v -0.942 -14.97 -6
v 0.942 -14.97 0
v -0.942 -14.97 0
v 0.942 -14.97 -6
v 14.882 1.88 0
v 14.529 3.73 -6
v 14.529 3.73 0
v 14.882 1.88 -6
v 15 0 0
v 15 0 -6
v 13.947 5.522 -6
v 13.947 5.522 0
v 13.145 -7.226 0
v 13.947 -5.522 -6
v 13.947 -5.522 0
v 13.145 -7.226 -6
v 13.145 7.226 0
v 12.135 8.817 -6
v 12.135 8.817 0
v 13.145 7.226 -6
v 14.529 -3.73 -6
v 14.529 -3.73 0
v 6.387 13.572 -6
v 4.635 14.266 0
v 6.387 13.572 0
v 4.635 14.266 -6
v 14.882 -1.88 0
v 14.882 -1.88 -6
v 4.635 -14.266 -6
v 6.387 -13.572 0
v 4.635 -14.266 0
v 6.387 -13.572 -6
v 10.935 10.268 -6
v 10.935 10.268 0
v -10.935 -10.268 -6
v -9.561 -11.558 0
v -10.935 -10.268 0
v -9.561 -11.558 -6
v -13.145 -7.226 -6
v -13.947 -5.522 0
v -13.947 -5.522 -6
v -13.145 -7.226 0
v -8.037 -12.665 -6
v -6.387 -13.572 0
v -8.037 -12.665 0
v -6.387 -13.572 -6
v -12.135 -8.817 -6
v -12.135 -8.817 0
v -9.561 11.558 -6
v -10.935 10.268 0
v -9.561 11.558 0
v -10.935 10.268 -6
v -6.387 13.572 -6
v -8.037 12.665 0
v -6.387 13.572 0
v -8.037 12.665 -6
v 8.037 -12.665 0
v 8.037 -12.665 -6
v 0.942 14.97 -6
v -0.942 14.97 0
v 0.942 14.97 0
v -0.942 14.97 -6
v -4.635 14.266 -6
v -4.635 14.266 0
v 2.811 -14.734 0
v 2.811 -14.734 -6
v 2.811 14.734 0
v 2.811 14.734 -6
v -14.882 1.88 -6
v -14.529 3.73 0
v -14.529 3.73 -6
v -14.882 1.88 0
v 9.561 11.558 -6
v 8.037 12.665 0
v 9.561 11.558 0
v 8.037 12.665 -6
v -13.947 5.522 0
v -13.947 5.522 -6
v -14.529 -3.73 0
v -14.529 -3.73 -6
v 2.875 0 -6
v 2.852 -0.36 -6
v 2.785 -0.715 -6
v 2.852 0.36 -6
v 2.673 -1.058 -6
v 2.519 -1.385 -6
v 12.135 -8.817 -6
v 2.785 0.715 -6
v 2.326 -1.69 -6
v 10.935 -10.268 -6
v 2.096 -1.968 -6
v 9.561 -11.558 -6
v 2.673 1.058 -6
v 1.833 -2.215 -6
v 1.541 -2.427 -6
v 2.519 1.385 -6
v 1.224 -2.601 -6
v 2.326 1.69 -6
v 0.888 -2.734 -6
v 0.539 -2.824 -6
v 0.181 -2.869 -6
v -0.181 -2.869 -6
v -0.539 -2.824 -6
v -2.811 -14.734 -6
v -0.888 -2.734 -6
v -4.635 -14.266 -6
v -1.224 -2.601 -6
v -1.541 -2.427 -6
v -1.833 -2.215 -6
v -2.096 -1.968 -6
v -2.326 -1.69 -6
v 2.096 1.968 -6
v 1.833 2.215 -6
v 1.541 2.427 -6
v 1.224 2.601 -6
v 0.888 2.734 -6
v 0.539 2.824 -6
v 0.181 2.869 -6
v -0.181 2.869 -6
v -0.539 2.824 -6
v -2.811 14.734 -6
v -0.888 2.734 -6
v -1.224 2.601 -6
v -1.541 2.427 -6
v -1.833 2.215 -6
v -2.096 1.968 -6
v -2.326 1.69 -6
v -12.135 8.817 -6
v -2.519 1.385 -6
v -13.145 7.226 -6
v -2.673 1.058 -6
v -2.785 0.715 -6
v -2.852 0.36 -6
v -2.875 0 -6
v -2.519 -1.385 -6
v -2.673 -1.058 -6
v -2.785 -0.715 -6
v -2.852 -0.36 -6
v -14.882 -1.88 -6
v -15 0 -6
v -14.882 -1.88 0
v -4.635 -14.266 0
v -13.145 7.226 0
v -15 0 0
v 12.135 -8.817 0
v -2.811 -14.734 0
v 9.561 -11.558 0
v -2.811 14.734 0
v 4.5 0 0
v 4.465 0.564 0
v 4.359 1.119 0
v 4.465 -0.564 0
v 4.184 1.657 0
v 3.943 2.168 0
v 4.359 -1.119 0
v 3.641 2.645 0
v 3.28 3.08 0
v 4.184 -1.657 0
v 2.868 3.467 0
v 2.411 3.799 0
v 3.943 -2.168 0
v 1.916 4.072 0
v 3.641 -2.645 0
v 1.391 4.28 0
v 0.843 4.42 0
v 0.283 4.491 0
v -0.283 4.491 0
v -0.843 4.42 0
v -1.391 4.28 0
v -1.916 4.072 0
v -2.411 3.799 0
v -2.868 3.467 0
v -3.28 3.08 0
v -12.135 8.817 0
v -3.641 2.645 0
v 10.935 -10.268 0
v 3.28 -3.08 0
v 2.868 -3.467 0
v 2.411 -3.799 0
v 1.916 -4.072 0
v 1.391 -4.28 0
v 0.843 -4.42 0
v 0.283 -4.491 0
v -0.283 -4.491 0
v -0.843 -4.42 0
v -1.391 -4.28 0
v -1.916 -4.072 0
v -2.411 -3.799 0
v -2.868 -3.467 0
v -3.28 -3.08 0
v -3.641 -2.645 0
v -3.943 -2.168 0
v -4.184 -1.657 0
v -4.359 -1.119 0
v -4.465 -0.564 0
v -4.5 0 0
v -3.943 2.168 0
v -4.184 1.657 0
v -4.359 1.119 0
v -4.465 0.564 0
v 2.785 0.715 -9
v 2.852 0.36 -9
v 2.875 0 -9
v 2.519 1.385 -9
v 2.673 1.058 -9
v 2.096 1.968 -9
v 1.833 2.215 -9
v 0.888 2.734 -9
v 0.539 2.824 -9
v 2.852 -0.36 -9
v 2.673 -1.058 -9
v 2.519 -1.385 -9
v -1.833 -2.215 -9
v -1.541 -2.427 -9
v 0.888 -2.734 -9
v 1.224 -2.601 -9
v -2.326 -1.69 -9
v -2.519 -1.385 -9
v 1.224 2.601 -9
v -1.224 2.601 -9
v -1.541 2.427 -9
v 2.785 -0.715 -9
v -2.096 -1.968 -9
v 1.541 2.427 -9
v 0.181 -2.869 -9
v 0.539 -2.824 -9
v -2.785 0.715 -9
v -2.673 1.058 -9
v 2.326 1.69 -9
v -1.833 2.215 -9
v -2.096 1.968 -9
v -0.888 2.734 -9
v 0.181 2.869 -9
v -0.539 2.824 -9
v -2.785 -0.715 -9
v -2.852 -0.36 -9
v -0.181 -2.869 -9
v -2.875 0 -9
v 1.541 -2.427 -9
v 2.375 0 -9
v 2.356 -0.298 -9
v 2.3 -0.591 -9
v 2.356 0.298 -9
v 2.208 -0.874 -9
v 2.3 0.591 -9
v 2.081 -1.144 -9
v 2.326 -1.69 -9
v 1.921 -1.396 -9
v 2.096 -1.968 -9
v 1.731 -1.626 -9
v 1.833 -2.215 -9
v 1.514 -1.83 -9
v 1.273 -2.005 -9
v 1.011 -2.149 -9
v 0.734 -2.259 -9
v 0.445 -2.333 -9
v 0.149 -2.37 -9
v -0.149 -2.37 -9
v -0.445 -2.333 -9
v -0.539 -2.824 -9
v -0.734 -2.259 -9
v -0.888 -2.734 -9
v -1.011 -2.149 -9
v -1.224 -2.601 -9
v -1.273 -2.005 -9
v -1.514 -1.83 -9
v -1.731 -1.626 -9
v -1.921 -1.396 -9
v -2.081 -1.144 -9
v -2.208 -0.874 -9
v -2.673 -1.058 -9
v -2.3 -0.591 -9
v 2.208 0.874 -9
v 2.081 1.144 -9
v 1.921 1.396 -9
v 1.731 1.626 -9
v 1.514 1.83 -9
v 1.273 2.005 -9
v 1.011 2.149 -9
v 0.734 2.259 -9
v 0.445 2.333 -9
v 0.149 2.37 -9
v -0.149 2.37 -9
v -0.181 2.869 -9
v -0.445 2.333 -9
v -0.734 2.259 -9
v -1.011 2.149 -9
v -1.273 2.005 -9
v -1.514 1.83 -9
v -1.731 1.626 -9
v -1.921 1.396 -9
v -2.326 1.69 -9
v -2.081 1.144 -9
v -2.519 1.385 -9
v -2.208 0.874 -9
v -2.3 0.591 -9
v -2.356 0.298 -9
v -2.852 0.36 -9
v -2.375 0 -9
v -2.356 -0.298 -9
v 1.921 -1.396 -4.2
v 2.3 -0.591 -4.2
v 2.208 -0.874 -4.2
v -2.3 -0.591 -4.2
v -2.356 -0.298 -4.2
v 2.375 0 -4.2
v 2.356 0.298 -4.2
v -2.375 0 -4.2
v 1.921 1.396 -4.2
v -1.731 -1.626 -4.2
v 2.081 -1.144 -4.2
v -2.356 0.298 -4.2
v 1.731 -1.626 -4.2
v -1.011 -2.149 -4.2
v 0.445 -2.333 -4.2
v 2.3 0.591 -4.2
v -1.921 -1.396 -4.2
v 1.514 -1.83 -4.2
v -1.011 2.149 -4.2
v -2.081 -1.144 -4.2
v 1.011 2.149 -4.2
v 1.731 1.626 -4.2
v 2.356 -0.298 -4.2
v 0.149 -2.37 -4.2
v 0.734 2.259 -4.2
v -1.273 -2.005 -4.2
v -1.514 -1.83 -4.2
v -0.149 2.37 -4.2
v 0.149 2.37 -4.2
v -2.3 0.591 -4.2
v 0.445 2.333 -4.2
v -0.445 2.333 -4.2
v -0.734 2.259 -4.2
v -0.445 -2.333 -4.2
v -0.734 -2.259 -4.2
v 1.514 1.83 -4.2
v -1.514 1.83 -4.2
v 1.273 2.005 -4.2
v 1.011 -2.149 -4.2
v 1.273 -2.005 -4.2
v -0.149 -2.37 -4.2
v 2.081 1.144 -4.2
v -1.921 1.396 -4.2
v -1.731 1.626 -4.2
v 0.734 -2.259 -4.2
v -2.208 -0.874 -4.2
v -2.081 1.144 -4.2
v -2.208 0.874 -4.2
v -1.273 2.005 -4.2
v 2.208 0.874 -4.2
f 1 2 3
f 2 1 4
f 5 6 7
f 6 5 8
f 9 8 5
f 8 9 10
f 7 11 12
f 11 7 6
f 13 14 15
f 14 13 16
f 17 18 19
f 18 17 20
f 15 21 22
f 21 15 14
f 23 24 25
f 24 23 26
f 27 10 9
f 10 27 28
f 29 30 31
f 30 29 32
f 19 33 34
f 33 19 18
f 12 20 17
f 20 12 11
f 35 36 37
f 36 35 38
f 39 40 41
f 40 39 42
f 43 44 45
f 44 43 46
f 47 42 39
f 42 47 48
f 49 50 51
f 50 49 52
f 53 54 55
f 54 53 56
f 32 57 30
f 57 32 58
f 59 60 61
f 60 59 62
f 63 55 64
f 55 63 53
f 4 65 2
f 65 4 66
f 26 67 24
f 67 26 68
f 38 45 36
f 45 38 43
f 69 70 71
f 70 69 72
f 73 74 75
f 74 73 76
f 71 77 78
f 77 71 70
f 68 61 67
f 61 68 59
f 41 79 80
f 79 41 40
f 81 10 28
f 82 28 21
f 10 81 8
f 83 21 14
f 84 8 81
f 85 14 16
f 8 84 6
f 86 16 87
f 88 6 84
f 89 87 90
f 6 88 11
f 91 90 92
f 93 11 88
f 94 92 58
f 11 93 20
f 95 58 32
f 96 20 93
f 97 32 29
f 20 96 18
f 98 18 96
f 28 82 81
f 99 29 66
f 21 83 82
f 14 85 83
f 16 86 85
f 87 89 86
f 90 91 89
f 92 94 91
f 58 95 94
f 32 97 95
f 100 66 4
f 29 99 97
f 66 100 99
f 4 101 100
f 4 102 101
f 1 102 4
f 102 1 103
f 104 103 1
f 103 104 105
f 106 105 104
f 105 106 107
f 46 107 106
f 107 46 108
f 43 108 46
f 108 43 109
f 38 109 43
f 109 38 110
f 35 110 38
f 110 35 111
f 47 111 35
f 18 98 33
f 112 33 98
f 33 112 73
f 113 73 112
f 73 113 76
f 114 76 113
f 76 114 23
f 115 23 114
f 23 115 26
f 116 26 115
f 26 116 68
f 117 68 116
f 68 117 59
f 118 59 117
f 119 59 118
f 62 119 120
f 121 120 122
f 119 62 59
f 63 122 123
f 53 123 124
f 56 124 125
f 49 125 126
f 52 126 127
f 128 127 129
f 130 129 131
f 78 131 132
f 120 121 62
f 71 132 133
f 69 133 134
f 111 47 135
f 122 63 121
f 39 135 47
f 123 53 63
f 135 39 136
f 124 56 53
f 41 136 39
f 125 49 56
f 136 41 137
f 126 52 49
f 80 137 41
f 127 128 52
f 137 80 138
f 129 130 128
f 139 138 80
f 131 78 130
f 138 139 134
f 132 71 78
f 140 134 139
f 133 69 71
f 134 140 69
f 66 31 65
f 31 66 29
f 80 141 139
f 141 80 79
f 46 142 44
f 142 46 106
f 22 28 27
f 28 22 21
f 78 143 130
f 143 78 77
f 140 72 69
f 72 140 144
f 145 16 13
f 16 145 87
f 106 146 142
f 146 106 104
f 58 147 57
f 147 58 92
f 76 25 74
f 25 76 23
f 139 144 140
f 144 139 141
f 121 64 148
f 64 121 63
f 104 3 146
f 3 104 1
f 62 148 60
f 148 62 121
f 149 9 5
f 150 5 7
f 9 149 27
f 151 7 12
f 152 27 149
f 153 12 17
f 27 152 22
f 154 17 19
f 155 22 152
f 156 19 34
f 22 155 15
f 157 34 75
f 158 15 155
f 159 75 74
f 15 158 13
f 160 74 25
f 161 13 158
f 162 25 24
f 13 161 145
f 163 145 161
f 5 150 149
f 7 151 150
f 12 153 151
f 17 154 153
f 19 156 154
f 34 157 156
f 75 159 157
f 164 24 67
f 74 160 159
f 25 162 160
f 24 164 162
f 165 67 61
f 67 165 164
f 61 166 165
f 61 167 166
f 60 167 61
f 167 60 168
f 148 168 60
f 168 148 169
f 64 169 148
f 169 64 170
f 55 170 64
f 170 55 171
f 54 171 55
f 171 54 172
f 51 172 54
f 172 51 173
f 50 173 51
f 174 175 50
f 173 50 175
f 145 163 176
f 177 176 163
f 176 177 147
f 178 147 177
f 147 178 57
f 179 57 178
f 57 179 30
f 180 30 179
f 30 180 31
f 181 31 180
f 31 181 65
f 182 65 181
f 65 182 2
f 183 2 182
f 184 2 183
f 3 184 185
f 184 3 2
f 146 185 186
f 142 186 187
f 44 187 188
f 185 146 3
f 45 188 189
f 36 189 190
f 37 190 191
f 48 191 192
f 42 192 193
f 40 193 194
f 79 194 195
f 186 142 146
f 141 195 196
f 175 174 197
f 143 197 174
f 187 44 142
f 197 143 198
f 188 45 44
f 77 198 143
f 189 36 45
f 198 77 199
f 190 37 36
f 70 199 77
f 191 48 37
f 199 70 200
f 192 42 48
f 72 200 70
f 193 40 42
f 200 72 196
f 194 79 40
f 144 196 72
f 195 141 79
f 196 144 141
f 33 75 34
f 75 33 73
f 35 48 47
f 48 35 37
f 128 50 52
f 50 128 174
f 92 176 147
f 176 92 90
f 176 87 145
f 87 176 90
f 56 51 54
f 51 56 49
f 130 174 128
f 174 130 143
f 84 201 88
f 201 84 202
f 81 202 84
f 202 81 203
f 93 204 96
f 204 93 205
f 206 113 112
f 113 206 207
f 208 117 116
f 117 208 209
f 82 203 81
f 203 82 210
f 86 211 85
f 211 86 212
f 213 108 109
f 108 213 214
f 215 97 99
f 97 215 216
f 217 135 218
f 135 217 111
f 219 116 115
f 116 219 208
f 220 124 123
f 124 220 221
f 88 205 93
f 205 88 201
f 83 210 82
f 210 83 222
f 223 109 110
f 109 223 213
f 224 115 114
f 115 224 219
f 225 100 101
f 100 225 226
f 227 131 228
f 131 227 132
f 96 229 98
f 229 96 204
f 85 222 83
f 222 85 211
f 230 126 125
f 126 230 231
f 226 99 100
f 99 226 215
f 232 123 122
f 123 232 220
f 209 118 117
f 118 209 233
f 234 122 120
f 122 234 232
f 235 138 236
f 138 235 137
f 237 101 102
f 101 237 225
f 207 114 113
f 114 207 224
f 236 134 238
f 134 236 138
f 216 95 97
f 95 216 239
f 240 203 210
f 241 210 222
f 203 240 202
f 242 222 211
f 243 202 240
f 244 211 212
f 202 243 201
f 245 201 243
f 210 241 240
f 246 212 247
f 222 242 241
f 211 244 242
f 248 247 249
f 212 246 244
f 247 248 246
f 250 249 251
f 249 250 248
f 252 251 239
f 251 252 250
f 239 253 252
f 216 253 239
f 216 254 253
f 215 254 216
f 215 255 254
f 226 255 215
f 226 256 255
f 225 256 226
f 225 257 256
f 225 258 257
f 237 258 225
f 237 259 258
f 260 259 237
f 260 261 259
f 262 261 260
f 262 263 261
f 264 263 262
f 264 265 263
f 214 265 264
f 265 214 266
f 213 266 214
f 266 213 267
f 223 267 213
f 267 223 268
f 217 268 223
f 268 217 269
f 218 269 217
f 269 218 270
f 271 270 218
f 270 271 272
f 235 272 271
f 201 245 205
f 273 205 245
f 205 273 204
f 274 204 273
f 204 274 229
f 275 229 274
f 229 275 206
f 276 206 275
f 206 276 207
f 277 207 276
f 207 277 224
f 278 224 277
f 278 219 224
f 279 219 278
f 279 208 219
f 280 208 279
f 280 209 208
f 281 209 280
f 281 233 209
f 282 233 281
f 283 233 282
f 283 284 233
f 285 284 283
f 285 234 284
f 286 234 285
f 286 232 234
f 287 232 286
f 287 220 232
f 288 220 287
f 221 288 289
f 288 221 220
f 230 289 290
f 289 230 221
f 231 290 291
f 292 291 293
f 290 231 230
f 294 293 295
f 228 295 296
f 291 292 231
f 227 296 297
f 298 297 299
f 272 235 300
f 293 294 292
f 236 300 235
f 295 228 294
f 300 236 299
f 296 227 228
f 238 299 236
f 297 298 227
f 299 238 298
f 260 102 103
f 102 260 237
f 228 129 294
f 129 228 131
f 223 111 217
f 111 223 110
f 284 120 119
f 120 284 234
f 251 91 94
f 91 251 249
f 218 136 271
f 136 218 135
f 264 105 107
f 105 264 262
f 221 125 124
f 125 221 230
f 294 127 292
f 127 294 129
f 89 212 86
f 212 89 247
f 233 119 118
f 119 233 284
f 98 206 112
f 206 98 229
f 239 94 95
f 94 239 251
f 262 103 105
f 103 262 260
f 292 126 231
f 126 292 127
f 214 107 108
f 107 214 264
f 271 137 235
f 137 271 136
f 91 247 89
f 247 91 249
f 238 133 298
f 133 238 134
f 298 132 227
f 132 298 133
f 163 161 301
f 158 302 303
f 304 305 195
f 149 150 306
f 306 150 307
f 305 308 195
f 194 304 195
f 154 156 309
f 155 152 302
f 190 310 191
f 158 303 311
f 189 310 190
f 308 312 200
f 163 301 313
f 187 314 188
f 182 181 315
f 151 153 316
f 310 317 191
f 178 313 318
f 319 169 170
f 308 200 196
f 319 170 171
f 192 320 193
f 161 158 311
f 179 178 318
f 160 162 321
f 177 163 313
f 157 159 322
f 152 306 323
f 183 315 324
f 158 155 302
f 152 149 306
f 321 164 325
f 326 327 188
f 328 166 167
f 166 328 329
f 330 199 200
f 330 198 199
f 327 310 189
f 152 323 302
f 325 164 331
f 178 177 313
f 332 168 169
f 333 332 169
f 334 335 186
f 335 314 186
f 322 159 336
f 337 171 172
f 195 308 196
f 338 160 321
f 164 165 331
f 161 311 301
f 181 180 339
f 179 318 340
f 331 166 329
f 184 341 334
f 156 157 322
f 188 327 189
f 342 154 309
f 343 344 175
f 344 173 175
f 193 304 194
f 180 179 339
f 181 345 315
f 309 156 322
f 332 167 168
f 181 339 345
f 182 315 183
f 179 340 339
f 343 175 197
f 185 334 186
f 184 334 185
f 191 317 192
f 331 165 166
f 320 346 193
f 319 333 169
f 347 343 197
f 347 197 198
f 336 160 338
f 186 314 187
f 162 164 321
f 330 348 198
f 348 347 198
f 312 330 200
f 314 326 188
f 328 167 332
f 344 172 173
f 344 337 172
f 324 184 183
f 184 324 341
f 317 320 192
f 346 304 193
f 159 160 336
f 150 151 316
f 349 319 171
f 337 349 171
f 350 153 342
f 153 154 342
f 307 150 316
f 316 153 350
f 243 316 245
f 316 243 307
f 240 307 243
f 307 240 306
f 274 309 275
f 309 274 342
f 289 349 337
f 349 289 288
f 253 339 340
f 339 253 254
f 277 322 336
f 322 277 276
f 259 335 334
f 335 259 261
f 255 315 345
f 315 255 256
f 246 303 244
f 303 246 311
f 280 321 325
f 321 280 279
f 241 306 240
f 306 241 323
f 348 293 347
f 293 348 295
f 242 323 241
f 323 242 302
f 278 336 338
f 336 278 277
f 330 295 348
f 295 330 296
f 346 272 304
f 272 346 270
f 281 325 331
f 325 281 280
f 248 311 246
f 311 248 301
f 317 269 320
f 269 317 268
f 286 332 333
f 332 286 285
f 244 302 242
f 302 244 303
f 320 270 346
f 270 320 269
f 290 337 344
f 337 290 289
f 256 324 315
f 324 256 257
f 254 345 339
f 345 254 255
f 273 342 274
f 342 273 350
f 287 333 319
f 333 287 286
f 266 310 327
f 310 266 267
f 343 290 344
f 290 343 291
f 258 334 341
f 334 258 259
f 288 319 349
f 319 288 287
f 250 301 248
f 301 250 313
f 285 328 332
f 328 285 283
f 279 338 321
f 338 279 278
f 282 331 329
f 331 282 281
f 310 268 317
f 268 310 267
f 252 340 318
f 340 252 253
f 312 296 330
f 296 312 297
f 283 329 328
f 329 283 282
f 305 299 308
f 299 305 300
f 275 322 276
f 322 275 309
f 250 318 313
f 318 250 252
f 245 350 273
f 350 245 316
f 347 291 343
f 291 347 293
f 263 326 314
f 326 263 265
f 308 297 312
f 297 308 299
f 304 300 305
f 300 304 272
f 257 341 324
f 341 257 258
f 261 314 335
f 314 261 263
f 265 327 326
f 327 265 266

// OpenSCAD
$fn = 50;

difference() {
	union() {
		translate(v = [0, 0, -6.0]) {
			cylinder(h = 6, r = 15.0);
		}
		#translate(v = [0, 0, -9.0]) {
			cylinder(h = 9, r = 2.875);
		}
	}
	union() {
		translate(v = [0, 0, 0]) {
			rotate(a = [0, 0, 0]) {
				difference() {
					union() {
						translate(v = [0, 0, -9.0]) {
							cylinder(h = 9, r = 2.25);
						}
						translate(v = [0, 0, -4.2]) {
							cylinder(h = 4.2, r1 = 2.375, r2 = 4.5);
						}
						translate(v = [0, 0, -9.0]) {
							cylinder(h = 9, r = 2.375);
						}
						translate(v = [0, 0, -9.0]) {
							cylinder(h = 9, r = 2.25);
						}
					}
					union();
				}
			}
		}
	}
}
